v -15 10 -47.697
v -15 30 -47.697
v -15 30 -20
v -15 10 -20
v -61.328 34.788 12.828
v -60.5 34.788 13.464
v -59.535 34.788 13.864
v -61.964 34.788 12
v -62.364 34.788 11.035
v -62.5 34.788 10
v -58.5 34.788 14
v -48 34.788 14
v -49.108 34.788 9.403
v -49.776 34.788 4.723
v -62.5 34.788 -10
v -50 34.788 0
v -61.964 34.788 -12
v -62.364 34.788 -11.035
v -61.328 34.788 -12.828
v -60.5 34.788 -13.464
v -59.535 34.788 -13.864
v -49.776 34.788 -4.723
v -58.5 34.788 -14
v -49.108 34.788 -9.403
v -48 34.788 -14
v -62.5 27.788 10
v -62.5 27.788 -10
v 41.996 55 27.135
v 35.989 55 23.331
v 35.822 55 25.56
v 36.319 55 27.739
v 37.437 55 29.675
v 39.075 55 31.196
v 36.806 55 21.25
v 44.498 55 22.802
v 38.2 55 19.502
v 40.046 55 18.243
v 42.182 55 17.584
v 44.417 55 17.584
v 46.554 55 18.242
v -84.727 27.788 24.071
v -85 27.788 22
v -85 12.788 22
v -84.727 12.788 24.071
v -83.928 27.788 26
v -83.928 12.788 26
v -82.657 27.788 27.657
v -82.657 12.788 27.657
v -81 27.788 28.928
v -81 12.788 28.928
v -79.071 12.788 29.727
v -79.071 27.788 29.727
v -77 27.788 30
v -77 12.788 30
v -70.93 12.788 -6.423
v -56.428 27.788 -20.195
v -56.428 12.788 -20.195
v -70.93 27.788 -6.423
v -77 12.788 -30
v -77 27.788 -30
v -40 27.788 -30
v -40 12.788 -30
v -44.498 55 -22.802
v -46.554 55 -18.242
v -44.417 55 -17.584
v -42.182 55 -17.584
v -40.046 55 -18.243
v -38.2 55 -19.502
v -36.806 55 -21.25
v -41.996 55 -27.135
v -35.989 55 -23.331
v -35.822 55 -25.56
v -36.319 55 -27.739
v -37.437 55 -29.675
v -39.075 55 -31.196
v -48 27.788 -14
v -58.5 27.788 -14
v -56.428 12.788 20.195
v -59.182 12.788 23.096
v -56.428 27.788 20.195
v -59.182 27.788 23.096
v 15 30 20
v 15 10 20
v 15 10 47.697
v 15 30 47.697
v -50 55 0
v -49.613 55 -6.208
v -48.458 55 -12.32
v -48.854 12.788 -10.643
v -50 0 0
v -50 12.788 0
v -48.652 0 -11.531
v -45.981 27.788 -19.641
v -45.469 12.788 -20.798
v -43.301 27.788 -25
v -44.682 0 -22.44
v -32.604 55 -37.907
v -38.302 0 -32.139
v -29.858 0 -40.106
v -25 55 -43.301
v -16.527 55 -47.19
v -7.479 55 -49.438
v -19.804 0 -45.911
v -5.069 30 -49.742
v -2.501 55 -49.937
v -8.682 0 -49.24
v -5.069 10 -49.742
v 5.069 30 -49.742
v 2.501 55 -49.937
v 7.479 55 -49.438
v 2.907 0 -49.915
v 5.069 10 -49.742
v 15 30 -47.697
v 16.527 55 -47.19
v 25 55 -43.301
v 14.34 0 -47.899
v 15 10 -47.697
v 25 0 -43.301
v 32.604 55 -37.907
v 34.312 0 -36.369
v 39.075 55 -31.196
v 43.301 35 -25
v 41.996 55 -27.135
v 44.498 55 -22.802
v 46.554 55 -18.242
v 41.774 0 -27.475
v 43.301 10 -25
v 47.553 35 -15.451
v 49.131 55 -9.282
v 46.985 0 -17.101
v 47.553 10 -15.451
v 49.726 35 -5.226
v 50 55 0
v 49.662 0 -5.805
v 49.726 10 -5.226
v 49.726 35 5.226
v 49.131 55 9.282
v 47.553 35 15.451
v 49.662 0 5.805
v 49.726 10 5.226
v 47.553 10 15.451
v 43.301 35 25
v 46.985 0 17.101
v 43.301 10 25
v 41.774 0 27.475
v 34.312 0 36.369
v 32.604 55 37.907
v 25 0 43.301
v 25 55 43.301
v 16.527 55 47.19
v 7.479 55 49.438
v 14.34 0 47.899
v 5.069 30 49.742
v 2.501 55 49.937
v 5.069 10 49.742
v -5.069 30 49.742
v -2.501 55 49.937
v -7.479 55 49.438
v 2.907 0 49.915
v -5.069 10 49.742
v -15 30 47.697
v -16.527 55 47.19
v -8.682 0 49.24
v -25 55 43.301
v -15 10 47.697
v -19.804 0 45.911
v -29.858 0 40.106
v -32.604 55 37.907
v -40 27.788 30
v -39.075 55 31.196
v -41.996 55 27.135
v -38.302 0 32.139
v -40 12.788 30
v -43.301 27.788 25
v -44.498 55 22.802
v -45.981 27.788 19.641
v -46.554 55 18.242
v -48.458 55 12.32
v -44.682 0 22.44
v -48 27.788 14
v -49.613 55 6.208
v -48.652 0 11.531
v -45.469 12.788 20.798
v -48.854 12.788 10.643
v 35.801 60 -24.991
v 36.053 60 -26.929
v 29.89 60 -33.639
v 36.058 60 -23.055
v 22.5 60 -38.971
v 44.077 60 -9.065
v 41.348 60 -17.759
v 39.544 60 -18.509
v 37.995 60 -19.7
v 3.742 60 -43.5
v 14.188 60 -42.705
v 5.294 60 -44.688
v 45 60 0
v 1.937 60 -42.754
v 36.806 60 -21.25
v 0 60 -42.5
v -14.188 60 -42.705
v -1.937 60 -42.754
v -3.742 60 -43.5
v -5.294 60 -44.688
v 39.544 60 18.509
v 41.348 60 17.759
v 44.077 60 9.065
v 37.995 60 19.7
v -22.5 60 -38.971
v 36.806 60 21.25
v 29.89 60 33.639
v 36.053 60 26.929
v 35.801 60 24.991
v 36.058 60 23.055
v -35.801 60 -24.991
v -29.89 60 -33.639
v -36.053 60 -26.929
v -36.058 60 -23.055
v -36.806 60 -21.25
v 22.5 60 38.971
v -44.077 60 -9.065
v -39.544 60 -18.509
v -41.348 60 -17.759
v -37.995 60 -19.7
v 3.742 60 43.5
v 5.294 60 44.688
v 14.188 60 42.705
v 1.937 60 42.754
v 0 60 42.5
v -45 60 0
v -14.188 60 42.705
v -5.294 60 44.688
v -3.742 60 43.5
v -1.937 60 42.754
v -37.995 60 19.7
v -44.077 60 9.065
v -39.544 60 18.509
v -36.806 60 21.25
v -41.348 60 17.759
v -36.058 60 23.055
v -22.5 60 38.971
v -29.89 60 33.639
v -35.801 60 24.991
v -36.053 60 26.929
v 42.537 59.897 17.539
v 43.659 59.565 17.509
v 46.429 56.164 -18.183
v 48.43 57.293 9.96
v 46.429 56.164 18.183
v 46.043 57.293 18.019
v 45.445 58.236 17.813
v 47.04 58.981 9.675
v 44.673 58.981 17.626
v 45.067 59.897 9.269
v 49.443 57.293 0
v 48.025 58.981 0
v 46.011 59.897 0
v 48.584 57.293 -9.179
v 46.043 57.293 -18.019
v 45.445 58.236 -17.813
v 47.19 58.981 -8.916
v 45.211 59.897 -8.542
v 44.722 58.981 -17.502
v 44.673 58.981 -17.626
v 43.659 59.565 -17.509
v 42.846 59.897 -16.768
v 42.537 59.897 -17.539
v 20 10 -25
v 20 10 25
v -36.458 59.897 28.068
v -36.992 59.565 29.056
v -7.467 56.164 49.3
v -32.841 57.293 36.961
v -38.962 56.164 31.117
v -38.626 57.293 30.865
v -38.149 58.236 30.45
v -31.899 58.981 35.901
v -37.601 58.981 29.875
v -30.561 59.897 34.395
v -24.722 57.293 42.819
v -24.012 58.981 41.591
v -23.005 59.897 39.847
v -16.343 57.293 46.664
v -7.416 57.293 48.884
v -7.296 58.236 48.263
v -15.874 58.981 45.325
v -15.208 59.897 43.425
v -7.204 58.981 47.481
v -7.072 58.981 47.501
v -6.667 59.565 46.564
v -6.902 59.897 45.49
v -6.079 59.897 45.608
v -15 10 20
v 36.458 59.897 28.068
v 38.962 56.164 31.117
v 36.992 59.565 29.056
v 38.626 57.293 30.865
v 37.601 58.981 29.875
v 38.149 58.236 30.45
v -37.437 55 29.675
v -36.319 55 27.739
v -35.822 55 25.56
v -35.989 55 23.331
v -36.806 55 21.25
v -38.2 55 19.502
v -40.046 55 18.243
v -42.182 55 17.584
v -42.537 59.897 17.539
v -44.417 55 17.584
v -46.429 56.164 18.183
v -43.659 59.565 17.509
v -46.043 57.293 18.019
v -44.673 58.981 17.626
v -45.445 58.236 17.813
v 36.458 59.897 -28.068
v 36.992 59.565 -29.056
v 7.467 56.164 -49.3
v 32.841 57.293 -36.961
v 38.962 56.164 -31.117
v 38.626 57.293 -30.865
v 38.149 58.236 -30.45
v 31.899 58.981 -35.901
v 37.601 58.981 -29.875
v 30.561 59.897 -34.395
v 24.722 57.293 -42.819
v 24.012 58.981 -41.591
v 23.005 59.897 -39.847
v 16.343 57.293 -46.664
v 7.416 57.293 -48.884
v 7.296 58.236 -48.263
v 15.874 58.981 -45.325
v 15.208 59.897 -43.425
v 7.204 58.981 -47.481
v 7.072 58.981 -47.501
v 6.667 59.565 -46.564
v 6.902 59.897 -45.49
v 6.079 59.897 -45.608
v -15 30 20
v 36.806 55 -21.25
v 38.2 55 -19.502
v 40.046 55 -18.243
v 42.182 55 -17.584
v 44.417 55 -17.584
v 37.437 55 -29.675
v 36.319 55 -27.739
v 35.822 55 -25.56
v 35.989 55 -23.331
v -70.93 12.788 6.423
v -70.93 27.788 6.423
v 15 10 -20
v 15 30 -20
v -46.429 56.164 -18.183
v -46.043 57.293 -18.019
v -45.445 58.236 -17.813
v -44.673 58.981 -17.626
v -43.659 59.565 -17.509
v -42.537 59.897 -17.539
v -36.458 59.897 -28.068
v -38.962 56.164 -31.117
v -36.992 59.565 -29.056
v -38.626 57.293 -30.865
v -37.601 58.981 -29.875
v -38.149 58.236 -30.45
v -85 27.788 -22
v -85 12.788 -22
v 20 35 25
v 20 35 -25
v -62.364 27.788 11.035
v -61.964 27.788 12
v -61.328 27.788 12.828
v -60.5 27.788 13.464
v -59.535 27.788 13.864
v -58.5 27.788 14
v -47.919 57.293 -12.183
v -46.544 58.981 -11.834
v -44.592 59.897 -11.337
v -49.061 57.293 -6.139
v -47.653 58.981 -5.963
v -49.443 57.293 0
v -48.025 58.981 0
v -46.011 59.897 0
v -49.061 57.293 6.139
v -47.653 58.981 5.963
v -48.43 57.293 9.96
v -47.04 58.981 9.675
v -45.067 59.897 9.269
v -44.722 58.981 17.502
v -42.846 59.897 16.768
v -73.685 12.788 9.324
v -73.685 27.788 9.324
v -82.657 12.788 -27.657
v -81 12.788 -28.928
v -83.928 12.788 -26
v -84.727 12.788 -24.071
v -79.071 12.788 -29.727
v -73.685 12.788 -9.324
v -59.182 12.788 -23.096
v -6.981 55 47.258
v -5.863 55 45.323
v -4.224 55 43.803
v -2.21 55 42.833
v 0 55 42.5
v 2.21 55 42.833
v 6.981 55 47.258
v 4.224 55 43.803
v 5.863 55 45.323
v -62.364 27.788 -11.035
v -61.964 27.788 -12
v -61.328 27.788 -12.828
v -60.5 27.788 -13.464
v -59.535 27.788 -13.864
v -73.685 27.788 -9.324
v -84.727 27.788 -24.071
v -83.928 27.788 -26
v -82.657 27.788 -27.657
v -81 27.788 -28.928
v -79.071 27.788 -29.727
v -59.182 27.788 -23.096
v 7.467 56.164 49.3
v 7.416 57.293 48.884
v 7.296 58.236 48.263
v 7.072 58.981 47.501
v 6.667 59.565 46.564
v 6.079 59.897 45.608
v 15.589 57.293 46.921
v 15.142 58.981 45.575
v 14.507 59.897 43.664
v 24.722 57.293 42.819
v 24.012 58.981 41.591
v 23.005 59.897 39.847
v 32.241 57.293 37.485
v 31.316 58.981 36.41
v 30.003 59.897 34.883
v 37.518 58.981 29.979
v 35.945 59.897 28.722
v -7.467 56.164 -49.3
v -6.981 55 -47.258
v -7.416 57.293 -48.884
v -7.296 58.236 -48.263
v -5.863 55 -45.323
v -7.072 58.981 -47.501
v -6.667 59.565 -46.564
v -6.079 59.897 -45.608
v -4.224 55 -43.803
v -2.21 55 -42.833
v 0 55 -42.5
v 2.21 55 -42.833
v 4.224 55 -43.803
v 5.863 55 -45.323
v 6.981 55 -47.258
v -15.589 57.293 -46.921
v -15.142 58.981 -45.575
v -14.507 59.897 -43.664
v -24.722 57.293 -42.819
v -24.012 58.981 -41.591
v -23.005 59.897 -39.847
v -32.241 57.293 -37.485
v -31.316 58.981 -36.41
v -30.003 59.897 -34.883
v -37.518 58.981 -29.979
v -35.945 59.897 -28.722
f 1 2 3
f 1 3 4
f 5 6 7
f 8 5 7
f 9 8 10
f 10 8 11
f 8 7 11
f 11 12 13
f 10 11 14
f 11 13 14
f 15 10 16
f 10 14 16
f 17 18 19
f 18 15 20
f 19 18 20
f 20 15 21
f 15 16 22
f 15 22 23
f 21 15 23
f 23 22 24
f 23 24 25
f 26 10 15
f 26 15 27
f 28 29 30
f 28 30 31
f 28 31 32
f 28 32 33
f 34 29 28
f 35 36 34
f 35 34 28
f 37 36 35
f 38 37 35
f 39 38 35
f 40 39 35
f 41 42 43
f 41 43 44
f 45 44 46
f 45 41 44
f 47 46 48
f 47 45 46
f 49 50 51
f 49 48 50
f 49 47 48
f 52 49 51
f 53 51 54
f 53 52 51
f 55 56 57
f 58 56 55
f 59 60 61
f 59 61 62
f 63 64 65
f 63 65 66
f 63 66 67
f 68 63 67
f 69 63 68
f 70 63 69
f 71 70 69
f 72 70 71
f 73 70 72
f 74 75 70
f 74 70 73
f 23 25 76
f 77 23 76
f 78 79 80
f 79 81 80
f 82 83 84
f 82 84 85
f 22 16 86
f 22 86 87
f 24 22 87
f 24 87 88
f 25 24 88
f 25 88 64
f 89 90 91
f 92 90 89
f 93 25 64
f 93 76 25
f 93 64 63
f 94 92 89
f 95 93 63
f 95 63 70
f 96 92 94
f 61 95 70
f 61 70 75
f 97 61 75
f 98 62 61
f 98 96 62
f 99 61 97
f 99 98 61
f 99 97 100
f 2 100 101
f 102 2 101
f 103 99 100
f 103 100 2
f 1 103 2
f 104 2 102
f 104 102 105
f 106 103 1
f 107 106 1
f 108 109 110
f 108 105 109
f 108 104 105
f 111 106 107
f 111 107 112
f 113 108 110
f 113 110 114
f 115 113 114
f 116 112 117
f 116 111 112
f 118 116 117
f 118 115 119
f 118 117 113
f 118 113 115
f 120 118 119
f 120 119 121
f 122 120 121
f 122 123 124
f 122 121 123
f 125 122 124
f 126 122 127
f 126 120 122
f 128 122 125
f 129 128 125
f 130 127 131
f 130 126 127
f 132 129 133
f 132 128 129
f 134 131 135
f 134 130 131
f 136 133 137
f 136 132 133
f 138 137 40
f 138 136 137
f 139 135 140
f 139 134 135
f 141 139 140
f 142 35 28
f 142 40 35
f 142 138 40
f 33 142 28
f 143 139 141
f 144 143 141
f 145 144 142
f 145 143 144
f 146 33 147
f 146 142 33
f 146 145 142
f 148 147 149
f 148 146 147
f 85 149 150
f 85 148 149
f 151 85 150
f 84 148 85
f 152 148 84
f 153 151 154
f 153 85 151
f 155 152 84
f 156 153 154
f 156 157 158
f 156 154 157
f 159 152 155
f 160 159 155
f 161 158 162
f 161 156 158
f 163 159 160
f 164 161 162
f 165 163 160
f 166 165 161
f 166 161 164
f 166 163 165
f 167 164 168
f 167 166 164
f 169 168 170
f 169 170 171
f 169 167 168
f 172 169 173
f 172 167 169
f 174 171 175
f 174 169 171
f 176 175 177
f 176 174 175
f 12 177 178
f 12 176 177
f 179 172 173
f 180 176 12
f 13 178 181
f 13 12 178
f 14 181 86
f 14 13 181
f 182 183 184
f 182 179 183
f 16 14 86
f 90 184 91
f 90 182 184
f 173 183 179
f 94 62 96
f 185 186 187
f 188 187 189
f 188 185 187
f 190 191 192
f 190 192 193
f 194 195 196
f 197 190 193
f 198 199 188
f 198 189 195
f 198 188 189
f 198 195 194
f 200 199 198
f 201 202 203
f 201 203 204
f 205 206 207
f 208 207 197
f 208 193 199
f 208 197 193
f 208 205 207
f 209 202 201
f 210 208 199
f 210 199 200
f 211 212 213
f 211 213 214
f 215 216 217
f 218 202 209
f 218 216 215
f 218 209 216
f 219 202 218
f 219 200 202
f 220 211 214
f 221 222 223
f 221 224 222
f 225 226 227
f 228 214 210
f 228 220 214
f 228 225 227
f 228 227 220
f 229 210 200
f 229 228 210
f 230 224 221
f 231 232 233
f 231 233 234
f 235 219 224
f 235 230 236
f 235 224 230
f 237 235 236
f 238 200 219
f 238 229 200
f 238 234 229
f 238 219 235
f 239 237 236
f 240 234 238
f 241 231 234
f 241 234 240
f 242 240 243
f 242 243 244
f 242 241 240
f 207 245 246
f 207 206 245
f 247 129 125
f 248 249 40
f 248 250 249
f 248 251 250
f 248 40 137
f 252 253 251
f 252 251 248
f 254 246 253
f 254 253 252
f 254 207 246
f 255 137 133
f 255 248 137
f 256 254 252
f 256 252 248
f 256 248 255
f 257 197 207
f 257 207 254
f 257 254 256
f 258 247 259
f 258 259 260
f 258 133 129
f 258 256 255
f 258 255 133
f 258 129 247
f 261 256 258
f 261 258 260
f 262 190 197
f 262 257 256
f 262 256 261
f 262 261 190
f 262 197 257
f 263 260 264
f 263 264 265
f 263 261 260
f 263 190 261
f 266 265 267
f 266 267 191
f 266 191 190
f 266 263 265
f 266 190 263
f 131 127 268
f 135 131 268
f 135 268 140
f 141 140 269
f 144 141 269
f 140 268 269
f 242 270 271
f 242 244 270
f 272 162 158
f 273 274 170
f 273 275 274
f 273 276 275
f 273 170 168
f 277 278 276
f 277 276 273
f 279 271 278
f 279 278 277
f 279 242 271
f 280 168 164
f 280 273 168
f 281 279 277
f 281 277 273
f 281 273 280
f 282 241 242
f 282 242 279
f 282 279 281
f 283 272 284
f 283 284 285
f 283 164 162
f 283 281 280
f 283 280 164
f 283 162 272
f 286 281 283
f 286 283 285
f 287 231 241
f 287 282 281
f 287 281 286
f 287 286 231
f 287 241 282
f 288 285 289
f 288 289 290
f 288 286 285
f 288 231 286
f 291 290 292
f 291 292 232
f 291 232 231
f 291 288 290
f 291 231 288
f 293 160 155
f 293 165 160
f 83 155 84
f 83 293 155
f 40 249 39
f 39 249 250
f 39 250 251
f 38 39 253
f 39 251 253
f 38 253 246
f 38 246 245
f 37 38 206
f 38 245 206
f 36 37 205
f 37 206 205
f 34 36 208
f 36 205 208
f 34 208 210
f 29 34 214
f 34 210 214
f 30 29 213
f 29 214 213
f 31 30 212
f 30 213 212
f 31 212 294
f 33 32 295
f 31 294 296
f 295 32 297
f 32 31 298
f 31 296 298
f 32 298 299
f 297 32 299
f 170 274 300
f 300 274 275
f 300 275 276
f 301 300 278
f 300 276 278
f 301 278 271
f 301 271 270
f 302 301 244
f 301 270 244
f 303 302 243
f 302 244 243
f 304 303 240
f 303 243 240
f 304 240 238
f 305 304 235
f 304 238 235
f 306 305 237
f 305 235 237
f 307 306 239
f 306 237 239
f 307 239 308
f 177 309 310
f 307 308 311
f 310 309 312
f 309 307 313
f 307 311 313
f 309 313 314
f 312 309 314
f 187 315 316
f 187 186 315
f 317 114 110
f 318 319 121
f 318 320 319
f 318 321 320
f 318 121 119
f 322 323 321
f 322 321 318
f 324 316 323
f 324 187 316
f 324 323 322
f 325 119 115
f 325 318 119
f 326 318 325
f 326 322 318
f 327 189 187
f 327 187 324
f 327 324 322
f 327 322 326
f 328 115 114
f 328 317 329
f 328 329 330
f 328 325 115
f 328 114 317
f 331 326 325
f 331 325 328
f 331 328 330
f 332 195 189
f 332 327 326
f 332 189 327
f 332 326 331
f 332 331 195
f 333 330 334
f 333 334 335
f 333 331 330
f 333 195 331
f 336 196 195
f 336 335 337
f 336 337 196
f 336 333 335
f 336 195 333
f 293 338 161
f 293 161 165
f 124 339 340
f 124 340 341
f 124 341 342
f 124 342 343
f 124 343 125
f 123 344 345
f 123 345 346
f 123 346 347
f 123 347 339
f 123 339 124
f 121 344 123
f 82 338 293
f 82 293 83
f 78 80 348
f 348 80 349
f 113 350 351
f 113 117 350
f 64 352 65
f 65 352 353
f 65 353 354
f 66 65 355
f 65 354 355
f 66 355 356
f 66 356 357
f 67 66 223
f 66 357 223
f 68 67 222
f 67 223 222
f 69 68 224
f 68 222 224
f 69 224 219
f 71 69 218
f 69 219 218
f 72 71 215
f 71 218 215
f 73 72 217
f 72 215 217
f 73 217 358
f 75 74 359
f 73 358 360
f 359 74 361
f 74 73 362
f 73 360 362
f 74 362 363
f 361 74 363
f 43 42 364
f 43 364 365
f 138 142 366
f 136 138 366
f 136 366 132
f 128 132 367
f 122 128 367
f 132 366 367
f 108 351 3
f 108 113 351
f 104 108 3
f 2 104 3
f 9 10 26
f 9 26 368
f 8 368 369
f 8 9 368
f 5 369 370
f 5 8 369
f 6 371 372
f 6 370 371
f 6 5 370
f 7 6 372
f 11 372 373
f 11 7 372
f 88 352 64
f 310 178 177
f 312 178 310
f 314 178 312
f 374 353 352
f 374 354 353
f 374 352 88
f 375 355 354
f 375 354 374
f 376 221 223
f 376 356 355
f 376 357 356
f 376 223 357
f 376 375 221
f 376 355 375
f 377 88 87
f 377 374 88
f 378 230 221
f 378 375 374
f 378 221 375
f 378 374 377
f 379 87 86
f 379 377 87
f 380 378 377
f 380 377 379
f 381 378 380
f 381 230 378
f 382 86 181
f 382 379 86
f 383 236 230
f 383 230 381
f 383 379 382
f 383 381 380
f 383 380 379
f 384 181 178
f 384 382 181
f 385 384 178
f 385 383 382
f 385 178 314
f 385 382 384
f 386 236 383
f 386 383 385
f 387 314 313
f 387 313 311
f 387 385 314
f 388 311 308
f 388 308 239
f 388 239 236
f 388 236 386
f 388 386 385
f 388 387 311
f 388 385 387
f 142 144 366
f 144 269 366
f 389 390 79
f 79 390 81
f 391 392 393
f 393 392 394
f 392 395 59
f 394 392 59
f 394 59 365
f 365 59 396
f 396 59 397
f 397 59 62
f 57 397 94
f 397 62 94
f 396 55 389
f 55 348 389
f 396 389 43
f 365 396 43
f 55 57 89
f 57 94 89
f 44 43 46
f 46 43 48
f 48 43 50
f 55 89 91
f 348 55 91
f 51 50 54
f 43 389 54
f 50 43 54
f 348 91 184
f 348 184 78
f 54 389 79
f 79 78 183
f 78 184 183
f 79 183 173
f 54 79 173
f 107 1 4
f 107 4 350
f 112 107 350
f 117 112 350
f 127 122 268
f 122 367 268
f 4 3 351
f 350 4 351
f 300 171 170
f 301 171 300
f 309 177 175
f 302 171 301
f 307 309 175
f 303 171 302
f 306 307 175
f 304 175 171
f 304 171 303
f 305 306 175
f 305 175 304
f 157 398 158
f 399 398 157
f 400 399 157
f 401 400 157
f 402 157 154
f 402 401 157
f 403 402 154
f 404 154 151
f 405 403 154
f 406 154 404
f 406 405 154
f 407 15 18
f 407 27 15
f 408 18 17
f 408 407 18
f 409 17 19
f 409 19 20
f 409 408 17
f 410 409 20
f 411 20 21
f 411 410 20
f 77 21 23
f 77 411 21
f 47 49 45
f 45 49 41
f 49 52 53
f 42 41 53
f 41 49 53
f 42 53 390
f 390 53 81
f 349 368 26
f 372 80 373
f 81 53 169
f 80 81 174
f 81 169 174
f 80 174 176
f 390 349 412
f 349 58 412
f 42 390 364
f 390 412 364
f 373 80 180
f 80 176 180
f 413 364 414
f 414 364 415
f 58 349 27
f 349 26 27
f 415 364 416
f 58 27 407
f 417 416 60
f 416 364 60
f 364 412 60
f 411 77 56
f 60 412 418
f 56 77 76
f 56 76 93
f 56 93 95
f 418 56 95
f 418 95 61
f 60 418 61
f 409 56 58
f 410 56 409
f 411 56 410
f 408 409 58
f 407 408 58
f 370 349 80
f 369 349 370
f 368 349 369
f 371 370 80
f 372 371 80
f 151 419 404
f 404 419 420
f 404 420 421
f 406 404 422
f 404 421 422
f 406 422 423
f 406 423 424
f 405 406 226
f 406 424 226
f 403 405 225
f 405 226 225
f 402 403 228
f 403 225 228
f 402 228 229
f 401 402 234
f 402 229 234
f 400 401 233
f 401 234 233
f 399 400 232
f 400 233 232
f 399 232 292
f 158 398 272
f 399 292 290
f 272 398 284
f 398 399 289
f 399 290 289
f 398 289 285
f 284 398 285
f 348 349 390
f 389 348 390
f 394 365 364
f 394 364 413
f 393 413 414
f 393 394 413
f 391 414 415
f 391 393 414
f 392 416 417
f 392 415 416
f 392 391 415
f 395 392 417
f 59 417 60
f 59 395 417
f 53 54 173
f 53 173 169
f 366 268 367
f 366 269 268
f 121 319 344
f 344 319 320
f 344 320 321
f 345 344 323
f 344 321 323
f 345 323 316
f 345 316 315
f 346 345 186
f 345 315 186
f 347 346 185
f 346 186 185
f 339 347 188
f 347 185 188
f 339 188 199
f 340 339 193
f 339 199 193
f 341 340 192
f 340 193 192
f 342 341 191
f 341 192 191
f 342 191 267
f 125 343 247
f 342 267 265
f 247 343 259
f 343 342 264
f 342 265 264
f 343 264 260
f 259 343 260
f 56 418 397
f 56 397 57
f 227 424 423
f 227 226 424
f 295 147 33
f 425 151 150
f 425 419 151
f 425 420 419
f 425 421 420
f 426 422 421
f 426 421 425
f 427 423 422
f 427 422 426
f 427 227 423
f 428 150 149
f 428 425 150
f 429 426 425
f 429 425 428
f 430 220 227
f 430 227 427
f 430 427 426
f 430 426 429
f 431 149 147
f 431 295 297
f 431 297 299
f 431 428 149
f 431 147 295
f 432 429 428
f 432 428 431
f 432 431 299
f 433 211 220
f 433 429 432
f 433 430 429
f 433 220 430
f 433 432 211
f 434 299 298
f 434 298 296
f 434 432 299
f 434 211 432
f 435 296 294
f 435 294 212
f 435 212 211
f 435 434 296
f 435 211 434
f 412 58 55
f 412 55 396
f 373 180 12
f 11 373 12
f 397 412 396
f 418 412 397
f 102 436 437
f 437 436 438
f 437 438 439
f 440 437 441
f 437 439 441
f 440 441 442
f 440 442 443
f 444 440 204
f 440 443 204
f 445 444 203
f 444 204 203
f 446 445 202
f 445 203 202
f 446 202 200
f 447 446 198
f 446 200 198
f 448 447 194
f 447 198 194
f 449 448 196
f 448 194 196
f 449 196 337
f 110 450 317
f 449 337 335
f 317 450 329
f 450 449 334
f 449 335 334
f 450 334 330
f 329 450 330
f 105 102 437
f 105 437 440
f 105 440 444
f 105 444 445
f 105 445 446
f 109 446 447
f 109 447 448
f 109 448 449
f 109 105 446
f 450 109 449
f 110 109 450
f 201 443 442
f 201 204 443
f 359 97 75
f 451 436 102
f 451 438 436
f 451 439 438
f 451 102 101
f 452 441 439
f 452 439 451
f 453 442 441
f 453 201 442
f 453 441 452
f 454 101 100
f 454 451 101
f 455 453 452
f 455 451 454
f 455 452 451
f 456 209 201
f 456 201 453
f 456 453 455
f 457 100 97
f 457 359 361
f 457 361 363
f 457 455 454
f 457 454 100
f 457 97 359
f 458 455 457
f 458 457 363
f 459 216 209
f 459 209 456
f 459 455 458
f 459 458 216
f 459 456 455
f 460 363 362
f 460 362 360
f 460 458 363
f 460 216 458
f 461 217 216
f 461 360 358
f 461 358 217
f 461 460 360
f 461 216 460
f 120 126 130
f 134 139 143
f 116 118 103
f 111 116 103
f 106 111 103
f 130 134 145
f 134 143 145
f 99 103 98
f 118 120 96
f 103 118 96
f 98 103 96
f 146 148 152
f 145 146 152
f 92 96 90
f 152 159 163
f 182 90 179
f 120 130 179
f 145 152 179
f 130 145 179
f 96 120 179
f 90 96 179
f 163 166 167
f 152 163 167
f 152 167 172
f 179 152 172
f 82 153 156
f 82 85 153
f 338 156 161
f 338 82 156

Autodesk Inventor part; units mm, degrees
sketch "Sketch1" plane through (0, 0, 0) normal (0, 1, 0) x (-1, 0, 0)
  circle A0 centre (0, 0) radius 50
  dimension "d0" = 100
extrude "Extrusion1" add sketch "Sketch1" along normal blind 60
sketch "Sketch2" plane through (0, 60, 0) normal (0, 1, 0) x (1, 0, 0)
  circle A0 centre (0, 0) radius 50 projected
  circle A1 centre (0, 50) radius 7.5
  circle A2 centre (43.3013, 25) radius 7.5
  circle A3 centre (43.3013, -25) radius 7.5
  circle A4 centre (0, -50) radius 7.5
  circle A5 centre (-43.3013, -25) radius 7.5
  circle A6 centre (-43.3013, 25) radius 7.5
  dimension "d3" = 15
  dimension "d6" = 360
fillet "Fillet1" radius 5 1 edges at (50, 60, 0)
extrude "Extrusion2" cut sketch "Sketch2" against normal blind 5 contours A2 A0 | A0 A2 | A3 A0 | A0 A3 | A1 A0 | A0 A1 | A4 A0 | A0 A4 | A6 A0 | A0 A6 | A5 A0 | A0 A5
ref_plane "Work Plane1" through (-50, 55, 0) normal (-1, 0, 0) x (0, -1, 0)
sketch "Sketch4" plane through (-50, 55, 0) normal (-1, 0, 0) x (0, -1, 0)
  line L0 (27.2118, -30) -> (42.2118, -30)
  line L1 (42.2118, -30) -> (42.2118, 30)
  line L2 (42.2118, 30) -> (27.2118, 30)
  line L3 (27.2118, 30) -> (27.2118, -30)
  point P0 (55, 0)
  dimension "d14" = 60
  dimension "d15" = 15
extrude "Extrusion4" add sketch "Sketch4" along normal mid plane 70
sketch "Sketch5" plane through (-50, 55, 0) normal (-1, 0, 0) x (0, -1, 0)
  line L0 (27.2118, 30) -> (27.2118, -30) projected
  line L1 (27.2118, 14) -> (20.2118, 14)
  line L2 (20.2118, 14) -> (20.2118, -14)
  line L3 (20.2118, -14) -> (27.2118, -14)
  line L4 (27.2118, -14) -> (27.2118, 14)
  point P0 (55, 0)
  dimension "d18" = 7
  dimension "d19" = 28
extrude "Extrusion5" add sketch "Sketch5" along normal mid plane 25
fillet "Fillet2" radius 8 2 edges at (-85, 20.2882, -30) (-85, 20.2882, 30)
sketch "Sketch6" plane through (-62.5, 27.7882, 14) normal (0, 1, 0) x (1, 0, 0)
  point P0 (62.5, 14)
ref_plane "Work Plane2" through (-62.5, 34.7882, 0) normal (0, 1, 0) x (1, 0, 0)
sketch "Sketch7" plane through (-62.5, 34.7882, 0) normal (0, 1, 0) x (1, 0, 0)
  line L0 (6.0723, 20.1953) -> (-8.4303, 6.4231)
  line L1 (-8.4303, 6.4231) -> (-11.1847, 9.3236)
  line L2 (-11.1847, 9.3236) -> (3.3179, 23.0958)
  line L3 (3.3179, 23.0958) -> (6.0723, 20.1953)
  line L4 (11.5119, 0) -> (-21.1929, 0)
  line L5 (6.0723, -20.1953) -> (-8.4303, -6.4231)
  line L6 (-8.4303, -6.4231) -> (-11.1847, -9.3236)
  line L7 (-11.1847, -9.3236) -> (3.3179, -23.0958)
  line L8 (3.3179, -23.0958) -> (6.0723, -20.1953)
  point P0 (62.5, 0)
  dimension "d23" = 20
  dimension "d24" = 4
extrude "Extrusion6" cut sketch "Sketch7" against normal blind 50
fillet "Fillet3" radius 4 2 edges at (-62.5, 31.2882, -14) (-62.5, 31.2882, 14)
sketch "Sketch11" plane through (0, 0, 0) normal (0, 0, 1) x (1, 0, 0)
  line L0 (-15, 10) -> (15, 10)
  line L1 (15, 10) -> (15, 30)
  line L2 (15, 30) -> (-15, 30)
  line L3 (-15, 30) -> (-15, 10)
  point P0 (0, 0)
  dimension "d29" = 30
  dimension "d30" = 20
extrude "Extrusion7" cut sketch "Sketch11" along normal mid plane 100
sketch "Sketch12" plane through (0, 0, 0) normal (0, 0, 1) x (1, 0, 0)
  line L0 (-15, 10) -> (15, 10)
  line L1 (15, 10) -> (15, 30)
  line L2 (15, 30) -> (-15, 30)
  line L3 (-15, 30) -> (-15, 10)
  point P0 (0, 0)
  dimension "d33" = 30
  dimension "d34" = 20
extrude "Extrusion8" add sketch "Sketch12" along normal mid plane 40
ref_plane "Work Plane7" through (22.6604, 3.5721, 0) normal (-0.766, 0.6428, 0) x (0, 0, 1)
ref_plane "Work Plane6" through (15, 10, 0) normal (-0.766, 0.6428, 0) x (0, 0, 1)
ref_plane "Work Plane8" through (20, 0, 0) normal (1, 0, 0) x (0, 1, 0)
sketch "Sketch18" plane through (20, 0, 0) normal (1, 0, 0) x (0, 1, 0)
  line L0 (10, 25) -> (35, 25)
  line L1 (35, 25) -> (35, -25)
  line L2 (35, -25) -> (10, -25)
  line L3 (10, -25) -> (10, 25)
  dimension "d52" = 25
  dimension "d53" = 50
extrude "Extrusion11" cut sketch "Sketch18" along normal blind 30
properties part number "redondogas"
